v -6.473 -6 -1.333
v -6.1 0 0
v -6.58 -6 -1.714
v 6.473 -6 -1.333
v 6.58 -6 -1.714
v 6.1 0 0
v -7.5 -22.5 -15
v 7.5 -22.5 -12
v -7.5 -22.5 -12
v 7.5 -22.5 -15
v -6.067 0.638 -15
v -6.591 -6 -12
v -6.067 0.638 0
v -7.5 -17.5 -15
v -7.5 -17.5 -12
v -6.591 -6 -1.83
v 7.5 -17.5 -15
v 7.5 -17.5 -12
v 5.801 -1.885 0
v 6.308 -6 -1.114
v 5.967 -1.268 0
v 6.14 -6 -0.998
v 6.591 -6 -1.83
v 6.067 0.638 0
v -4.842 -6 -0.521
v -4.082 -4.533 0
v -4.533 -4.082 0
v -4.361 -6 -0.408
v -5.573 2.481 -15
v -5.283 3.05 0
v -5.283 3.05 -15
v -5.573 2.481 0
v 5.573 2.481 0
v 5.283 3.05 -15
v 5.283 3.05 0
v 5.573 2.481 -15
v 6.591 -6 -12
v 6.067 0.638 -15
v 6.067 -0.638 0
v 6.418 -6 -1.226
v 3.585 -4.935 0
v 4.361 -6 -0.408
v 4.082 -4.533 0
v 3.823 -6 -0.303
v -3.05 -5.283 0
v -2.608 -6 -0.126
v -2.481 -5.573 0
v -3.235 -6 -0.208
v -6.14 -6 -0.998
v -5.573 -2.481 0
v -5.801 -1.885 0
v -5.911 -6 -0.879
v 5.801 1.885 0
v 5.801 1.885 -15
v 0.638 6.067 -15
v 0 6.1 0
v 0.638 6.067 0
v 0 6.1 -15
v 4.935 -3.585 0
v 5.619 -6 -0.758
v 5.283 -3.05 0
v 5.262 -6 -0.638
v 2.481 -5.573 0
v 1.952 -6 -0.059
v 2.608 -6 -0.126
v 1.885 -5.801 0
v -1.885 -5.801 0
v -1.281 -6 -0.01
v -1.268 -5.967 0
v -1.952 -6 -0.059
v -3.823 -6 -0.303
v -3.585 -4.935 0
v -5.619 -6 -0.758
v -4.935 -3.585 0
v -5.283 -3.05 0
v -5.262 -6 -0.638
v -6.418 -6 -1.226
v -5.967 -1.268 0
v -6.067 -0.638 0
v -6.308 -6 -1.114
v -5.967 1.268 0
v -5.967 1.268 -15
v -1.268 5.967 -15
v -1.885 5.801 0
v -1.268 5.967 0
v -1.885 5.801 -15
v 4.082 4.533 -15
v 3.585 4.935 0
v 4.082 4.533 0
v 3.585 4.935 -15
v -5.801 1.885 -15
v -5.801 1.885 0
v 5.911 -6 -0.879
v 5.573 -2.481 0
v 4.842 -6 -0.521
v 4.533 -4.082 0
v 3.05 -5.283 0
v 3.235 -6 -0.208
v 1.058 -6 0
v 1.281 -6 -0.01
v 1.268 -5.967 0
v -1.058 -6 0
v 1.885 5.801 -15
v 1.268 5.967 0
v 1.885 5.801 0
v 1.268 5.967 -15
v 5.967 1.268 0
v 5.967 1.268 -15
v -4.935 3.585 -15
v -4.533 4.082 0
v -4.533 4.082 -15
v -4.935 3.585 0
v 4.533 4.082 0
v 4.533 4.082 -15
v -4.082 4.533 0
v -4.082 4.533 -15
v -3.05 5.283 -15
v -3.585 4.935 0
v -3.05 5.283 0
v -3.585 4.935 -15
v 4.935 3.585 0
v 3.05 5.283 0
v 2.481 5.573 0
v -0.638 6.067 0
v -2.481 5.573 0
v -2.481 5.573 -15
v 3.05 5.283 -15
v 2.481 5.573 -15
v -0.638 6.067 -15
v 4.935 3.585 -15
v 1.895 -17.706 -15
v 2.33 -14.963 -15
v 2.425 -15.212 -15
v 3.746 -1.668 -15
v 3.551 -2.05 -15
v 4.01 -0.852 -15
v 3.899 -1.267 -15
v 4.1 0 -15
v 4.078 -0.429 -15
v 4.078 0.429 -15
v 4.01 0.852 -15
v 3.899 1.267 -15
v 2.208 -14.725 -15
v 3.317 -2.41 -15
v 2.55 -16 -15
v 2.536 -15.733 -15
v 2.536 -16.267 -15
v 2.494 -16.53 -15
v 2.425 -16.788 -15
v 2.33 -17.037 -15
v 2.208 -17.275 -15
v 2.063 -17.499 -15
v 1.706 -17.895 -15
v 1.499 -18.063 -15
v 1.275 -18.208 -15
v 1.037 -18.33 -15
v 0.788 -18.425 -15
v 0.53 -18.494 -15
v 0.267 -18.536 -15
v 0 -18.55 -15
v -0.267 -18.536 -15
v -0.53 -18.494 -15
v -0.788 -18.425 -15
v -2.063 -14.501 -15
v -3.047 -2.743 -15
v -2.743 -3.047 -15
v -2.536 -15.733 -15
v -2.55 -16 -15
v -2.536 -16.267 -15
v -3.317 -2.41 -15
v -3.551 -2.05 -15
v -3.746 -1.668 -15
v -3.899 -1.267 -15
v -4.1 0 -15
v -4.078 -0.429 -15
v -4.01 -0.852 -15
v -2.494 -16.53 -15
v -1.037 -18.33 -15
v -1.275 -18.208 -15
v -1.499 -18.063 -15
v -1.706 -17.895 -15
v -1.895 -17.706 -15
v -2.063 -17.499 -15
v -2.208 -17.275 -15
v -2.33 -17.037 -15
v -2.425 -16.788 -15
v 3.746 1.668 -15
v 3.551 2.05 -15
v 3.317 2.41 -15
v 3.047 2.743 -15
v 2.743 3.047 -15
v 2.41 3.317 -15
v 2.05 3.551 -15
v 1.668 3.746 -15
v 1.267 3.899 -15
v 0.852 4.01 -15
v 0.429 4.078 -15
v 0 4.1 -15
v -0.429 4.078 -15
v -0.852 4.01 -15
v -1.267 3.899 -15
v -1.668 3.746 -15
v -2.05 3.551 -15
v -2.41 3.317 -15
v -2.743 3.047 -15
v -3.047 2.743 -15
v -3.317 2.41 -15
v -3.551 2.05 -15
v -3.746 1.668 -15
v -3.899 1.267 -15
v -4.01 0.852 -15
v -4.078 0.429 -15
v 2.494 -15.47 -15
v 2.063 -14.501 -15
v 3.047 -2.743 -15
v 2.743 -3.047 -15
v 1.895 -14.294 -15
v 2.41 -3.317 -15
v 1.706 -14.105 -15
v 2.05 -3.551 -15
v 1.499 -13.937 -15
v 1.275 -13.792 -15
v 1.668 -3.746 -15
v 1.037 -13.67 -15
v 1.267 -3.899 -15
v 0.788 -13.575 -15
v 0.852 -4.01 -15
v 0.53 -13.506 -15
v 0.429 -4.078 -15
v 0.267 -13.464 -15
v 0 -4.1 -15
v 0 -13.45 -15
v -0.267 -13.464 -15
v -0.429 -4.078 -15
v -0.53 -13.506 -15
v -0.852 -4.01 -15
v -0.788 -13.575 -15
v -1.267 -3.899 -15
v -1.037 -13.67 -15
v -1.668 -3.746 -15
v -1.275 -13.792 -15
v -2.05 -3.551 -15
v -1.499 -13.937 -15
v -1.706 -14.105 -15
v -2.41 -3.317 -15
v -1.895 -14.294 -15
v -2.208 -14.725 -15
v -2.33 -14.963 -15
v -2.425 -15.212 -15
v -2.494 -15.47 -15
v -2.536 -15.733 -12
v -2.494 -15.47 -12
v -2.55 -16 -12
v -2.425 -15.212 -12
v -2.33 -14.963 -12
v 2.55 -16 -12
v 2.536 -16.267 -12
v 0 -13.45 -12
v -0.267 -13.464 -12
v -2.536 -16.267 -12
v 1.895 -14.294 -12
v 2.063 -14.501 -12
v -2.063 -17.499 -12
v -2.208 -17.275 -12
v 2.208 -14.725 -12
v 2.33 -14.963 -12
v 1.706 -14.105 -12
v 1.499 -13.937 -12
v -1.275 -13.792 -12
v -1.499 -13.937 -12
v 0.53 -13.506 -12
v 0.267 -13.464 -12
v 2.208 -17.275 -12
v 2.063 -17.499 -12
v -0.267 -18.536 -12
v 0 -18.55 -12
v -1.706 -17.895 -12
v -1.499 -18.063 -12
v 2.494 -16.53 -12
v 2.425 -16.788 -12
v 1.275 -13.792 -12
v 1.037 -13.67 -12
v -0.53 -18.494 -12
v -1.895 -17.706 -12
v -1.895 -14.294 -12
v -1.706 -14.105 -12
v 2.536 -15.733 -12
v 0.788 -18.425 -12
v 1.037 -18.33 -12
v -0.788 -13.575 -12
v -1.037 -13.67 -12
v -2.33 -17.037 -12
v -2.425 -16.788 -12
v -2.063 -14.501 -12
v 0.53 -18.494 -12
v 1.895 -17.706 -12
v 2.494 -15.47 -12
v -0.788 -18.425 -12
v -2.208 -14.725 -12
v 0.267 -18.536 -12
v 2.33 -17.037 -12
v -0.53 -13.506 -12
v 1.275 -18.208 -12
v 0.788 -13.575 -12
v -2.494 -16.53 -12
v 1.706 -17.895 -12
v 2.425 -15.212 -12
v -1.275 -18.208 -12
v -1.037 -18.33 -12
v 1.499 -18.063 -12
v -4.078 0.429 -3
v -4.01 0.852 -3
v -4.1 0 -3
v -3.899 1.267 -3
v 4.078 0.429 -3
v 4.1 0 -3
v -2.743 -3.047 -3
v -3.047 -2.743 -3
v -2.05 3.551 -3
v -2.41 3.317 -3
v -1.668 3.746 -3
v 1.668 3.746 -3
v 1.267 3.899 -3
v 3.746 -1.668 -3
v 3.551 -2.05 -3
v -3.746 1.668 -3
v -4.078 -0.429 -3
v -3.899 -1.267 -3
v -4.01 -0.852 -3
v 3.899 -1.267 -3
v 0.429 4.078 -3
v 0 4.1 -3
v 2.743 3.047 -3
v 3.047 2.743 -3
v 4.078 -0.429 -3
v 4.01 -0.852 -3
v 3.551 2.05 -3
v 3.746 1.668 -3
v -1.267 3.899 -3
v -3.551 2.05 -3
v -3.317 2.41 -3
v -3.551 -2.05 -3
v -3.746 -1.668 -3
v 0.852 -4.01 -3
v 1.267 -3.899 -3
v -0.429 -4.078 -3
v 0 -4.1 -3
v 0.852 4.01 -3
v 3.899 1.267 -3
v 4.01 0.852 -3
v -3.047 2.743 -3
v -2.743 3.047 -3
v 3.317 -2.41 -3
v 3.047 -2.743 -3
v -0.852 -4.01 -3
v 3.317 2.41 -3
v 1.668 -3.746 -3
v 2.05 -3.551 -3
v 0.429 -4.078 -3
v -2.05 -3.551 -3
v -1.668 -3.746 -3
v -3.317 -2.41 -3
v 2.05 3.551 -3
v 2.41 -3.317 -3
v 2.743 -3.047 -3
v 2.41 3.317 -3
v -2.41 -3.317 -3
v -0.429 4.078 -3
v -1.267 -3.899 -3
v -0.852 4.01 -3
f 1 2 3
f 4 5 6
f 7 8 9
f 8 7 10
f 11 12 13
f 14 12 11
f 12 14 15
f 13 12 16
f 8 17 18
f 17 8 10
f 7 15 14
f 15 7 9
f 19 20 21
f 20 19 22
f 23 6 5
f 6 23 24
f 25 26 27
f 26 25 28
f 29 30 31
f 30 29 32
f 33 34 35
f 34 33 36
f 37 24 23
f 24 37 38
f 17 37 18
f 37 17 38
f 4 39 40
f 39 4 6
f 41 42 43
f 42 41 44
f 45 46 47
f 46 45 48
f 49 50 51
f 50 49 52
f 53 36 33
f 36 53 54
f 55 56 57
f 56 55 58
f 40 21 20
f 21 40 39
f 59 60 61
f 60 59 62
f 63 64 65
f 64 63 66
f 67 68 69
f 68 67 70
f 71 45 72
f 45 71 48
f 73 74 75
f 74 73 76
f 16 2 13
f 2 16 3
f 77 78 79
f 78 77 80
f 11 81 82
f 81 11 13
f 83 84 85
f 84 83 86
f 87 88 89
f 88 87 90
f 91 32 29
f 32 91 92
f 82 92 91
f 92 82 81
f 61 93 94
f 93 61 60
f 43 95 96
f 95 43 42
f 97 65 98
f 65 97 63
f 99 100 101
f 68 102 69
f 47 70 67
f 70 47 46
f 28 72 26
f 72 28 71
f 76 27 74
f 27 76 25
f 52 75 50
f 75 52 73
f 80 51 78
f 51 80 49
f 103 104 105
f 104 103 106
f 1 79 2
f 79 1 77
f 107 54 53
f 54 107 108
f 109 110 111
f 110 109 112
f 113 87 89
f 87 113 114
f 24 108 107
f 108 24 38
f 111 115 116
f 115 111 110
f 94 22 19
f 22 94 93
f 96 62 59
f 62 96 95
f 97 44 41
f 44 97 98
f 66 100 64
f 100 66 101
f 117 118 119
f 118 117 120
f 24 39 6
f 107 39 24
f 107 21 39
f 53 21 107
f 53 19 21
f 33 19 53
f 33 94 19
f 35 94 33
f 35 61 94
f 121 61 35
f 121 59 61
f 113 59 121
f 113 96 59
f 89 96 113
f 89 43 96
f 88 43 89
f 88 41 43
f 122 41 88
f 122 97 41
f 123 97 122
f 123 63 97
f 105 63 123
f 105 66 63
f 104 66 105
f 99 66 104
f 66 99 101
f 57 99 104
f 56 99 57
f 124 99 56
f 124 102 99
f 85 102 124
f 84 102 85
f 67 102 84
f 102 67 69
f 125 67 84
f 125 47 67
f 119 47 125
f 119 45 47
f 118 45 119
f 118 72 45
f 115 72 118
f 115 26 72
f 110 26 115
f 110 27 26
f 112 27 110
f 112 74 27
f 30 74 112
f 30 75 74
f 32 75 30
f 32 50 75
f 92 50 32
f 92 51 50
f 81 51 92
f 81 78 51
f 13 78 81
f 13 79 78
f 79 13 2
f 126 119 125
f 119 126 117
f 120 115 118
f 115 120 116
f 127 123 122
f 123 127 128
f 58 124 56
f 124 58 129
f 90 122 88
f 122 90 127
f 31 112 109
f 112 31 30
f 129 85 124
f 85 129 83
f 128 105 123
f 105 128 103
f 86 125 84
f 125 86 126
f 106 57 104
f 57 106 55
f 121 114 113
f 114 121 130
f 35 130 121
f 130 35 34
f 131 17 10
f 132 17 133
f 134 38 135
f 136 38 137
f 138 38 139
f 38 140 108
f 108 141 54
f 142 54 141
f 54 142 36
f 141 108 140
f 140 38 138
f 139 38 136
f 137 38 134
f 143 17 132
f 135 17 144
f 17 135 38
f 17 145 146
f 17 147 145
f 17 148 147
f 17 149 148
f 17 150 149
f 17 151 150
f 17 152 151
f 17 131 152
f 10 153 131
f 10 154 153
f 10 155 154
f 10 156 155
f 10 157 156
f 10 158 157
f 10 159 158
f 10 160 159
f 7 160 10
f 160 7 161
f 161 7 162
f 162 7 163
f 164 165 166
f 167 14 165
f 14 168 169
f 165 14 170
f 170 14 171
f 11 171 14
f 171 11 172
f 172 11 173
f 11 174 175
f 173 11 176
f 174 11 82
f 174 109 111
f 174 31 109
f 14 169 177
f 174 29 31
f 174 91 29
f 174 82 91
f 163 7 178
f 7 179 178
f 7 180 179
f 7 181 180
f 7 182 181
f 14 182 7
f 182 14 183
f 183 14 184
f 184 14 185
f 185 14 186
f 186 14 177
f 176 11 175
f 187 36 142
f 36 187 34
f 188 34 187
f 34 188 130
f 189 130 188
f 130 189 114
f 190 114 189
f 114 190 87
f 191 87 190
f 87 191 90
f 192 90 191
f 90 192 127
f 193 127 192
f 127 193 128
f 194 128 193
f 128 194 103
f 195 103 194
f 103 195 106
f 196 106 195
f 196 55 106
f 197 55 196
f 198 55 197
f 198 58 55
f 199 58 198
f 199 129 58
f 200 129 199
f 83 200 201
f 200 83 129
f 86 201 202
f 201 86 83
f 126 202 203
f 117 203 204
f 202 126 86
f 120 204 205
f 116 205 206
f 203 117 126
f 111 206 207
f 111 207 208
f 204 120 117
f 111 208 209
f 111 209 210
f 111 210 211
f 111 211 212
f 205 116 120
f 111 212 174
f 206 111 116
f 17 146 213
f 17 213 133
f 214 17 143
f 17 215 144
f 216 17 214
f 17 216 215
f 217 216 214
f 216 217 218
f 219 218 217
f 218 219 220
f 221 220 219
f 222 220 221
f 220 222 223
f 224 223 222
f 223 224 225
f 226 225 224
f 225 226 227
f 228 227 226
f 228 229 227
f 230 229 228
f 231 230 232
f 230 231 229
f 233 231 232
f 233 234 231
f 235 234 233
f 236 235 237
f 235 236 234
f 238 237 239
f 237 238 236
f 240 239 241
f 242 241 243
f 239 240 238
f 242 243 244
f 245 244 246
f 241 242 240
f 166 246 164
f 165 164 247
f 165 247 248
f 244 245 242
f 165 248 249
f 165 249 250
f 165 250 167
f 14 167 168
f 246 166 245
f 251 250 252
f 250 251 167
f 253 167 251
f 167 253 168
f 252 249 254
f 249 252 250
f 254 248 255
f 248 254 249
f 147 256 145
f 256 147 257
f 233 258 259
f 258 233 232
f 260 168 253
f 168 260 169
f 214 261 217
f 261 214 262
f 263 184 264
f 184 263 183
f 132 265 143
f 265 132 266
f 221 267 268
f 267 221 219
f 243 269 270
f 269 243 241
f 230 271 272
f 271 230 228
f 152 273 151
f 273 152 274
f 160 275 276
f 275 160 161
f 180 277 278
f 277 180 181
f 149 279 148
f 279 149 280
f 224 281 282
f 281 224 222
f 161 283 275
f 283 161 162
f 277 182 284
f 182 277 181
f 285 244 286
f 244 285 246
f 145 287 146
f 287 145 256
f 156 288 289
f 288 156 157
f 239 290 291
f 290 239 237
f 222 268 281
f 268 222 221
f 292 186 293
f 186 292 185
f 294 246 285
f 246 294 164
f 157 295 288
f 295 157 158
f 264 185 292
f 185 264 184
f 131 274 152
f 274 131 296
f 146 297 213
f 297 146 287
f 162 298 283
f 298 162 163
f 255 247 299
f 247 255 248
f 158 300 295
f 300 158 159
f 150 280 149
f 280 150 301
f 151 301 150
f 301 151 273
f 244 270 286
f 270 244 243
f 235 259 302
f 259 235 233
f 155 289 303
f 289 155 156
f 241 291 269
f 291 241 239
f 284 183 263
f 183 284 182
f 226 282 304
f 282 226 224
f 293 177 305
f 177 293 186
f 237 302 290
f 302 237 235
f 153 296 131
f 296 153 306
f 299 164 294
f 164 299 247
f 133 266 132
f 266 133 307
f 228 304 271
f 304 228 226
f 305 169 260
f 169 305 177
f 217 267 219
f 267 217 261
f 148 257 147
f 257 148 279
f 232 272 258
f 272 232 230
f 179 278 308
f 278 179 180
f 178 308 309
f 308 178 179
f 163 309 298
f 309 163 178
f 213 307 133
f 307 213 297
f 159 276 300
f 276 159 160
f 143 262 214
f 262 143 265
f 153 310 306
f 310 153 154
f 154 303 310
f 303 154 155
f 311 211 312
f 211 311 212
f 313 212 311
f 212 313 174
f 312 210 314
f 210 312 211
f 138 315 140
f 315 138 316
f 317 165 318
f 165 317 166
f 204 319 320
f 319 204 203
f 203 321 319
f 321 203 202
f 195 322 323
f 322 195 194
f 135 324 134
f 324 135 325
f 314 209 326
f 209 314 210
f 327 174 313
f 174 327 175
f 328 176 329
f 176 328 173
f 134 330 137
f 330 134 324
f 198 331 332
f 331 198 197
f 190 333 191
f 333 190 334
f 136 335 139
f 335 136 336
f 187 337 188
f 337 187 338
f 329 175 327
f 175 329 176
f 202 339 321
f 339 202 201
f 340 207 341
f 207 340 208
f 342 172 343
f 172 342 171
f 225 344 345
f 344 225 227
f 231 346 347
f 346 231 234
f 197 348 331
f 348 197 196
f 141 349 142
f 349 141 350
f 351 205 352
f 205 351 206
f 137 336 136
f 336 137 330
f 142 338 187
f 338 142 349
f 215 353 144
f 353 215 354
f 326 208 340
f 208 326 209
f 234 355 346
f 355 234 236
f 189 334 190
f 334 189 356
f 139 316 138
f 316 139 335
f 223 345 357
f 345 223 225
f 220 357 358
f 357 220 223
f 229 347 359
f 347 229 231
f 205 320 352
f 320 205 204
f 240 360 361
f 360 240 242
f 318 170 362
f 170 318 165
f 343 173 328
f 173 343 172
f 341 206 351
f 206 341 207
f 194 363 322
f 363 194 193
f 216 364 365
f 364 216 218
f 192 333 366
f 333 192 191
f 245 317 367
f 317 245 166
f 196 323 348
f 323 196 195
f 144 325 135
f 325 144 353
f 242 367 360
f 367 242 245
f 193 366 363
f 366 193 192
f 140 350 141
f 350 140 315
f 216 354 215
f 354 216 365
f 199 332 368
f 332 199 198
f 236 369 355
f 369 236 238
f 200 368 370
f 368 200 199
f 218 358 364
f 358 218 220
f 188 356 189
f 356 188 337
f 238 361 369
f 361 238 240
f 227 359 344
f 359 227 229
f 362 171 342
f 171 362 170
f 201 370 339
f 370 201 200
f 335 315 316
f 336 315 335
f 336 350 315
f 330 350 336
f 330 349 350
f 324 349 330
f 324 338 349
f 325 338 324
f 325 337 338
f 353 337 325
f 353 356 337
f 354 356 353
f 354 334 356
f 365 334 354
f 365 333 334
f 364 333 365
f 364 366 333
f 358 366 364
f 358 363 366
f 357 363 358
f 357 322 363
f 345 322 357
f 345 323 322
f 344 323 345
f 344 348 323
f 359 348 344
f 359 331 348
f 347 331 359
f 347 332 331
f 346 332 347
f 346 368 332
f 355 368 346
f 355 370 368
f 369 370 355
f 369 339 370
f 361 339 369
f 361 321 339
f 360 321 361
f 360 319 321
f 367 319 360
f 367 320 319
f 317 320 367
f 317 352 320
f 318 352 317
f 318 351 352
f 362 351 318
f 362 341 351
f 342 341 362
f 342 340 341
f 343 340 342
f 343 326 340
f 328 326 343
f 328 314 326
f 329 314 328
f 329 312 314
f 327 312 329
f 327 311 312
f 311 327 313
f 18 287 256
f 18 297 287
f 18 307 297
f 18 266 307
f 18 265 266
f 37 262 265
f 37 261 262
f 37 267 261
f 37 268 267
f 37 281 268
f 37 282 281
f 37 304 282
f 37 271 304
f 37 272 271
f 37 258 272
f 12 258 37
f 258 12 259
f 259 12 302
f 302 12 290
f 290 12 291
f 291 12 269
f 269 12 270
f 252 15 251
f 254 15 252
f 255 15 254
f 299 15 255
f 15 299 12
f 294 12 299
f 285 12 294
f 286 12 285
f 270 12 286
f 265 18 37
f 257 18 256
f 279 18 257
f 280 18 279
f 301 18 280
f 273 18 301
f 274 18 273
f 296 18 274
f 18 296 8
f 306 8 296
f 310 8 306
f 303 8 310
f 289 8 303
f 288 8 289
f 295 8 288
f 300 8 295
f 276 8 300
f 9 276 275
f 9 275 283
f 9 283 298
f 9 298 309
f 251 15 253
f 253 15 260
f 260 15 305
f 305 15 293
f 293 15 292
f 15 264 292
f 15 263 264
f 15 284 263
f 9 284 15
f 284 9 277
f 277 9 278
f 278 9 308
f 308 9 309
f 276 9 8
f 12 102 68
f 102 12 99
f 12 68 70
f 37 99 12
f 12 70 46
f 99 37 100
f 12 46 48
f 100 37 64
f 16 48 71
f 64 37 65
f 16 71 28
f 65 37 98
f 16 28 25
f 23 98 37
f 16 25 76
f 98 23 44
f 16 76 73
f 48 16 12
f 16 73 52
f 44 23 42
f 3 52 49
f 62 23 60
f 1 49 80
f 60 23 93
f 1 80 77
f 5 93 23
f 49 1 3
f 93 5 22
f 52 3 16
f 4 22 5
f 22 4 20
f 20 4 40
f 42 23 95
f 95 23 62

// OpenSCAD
// 2020 holder for Y

rotate([0,180,0])y_rod_holder(rod=8);

module y_rod_holder(rod=8) {
  difference() {
    union() {
      hull() {
        cylinder(r=(rod/2)+0.1+2, h = 15, $fn=60);
        translate([0,-20,10])rotate([90,0,0])cube([15,10,5],center=true);
      }
    }
    translate([0,-12-(rod/2),0])cylinder(r=5.1/2,h=15,$fn=60);
    translate([0,0,3])cylinder(r=(rod/2)+0.1, h = 15, $fn=60);
    translate([0,-12-(rod/2),2]) color("red") cube([20,20,20],center=true);
  }
}
